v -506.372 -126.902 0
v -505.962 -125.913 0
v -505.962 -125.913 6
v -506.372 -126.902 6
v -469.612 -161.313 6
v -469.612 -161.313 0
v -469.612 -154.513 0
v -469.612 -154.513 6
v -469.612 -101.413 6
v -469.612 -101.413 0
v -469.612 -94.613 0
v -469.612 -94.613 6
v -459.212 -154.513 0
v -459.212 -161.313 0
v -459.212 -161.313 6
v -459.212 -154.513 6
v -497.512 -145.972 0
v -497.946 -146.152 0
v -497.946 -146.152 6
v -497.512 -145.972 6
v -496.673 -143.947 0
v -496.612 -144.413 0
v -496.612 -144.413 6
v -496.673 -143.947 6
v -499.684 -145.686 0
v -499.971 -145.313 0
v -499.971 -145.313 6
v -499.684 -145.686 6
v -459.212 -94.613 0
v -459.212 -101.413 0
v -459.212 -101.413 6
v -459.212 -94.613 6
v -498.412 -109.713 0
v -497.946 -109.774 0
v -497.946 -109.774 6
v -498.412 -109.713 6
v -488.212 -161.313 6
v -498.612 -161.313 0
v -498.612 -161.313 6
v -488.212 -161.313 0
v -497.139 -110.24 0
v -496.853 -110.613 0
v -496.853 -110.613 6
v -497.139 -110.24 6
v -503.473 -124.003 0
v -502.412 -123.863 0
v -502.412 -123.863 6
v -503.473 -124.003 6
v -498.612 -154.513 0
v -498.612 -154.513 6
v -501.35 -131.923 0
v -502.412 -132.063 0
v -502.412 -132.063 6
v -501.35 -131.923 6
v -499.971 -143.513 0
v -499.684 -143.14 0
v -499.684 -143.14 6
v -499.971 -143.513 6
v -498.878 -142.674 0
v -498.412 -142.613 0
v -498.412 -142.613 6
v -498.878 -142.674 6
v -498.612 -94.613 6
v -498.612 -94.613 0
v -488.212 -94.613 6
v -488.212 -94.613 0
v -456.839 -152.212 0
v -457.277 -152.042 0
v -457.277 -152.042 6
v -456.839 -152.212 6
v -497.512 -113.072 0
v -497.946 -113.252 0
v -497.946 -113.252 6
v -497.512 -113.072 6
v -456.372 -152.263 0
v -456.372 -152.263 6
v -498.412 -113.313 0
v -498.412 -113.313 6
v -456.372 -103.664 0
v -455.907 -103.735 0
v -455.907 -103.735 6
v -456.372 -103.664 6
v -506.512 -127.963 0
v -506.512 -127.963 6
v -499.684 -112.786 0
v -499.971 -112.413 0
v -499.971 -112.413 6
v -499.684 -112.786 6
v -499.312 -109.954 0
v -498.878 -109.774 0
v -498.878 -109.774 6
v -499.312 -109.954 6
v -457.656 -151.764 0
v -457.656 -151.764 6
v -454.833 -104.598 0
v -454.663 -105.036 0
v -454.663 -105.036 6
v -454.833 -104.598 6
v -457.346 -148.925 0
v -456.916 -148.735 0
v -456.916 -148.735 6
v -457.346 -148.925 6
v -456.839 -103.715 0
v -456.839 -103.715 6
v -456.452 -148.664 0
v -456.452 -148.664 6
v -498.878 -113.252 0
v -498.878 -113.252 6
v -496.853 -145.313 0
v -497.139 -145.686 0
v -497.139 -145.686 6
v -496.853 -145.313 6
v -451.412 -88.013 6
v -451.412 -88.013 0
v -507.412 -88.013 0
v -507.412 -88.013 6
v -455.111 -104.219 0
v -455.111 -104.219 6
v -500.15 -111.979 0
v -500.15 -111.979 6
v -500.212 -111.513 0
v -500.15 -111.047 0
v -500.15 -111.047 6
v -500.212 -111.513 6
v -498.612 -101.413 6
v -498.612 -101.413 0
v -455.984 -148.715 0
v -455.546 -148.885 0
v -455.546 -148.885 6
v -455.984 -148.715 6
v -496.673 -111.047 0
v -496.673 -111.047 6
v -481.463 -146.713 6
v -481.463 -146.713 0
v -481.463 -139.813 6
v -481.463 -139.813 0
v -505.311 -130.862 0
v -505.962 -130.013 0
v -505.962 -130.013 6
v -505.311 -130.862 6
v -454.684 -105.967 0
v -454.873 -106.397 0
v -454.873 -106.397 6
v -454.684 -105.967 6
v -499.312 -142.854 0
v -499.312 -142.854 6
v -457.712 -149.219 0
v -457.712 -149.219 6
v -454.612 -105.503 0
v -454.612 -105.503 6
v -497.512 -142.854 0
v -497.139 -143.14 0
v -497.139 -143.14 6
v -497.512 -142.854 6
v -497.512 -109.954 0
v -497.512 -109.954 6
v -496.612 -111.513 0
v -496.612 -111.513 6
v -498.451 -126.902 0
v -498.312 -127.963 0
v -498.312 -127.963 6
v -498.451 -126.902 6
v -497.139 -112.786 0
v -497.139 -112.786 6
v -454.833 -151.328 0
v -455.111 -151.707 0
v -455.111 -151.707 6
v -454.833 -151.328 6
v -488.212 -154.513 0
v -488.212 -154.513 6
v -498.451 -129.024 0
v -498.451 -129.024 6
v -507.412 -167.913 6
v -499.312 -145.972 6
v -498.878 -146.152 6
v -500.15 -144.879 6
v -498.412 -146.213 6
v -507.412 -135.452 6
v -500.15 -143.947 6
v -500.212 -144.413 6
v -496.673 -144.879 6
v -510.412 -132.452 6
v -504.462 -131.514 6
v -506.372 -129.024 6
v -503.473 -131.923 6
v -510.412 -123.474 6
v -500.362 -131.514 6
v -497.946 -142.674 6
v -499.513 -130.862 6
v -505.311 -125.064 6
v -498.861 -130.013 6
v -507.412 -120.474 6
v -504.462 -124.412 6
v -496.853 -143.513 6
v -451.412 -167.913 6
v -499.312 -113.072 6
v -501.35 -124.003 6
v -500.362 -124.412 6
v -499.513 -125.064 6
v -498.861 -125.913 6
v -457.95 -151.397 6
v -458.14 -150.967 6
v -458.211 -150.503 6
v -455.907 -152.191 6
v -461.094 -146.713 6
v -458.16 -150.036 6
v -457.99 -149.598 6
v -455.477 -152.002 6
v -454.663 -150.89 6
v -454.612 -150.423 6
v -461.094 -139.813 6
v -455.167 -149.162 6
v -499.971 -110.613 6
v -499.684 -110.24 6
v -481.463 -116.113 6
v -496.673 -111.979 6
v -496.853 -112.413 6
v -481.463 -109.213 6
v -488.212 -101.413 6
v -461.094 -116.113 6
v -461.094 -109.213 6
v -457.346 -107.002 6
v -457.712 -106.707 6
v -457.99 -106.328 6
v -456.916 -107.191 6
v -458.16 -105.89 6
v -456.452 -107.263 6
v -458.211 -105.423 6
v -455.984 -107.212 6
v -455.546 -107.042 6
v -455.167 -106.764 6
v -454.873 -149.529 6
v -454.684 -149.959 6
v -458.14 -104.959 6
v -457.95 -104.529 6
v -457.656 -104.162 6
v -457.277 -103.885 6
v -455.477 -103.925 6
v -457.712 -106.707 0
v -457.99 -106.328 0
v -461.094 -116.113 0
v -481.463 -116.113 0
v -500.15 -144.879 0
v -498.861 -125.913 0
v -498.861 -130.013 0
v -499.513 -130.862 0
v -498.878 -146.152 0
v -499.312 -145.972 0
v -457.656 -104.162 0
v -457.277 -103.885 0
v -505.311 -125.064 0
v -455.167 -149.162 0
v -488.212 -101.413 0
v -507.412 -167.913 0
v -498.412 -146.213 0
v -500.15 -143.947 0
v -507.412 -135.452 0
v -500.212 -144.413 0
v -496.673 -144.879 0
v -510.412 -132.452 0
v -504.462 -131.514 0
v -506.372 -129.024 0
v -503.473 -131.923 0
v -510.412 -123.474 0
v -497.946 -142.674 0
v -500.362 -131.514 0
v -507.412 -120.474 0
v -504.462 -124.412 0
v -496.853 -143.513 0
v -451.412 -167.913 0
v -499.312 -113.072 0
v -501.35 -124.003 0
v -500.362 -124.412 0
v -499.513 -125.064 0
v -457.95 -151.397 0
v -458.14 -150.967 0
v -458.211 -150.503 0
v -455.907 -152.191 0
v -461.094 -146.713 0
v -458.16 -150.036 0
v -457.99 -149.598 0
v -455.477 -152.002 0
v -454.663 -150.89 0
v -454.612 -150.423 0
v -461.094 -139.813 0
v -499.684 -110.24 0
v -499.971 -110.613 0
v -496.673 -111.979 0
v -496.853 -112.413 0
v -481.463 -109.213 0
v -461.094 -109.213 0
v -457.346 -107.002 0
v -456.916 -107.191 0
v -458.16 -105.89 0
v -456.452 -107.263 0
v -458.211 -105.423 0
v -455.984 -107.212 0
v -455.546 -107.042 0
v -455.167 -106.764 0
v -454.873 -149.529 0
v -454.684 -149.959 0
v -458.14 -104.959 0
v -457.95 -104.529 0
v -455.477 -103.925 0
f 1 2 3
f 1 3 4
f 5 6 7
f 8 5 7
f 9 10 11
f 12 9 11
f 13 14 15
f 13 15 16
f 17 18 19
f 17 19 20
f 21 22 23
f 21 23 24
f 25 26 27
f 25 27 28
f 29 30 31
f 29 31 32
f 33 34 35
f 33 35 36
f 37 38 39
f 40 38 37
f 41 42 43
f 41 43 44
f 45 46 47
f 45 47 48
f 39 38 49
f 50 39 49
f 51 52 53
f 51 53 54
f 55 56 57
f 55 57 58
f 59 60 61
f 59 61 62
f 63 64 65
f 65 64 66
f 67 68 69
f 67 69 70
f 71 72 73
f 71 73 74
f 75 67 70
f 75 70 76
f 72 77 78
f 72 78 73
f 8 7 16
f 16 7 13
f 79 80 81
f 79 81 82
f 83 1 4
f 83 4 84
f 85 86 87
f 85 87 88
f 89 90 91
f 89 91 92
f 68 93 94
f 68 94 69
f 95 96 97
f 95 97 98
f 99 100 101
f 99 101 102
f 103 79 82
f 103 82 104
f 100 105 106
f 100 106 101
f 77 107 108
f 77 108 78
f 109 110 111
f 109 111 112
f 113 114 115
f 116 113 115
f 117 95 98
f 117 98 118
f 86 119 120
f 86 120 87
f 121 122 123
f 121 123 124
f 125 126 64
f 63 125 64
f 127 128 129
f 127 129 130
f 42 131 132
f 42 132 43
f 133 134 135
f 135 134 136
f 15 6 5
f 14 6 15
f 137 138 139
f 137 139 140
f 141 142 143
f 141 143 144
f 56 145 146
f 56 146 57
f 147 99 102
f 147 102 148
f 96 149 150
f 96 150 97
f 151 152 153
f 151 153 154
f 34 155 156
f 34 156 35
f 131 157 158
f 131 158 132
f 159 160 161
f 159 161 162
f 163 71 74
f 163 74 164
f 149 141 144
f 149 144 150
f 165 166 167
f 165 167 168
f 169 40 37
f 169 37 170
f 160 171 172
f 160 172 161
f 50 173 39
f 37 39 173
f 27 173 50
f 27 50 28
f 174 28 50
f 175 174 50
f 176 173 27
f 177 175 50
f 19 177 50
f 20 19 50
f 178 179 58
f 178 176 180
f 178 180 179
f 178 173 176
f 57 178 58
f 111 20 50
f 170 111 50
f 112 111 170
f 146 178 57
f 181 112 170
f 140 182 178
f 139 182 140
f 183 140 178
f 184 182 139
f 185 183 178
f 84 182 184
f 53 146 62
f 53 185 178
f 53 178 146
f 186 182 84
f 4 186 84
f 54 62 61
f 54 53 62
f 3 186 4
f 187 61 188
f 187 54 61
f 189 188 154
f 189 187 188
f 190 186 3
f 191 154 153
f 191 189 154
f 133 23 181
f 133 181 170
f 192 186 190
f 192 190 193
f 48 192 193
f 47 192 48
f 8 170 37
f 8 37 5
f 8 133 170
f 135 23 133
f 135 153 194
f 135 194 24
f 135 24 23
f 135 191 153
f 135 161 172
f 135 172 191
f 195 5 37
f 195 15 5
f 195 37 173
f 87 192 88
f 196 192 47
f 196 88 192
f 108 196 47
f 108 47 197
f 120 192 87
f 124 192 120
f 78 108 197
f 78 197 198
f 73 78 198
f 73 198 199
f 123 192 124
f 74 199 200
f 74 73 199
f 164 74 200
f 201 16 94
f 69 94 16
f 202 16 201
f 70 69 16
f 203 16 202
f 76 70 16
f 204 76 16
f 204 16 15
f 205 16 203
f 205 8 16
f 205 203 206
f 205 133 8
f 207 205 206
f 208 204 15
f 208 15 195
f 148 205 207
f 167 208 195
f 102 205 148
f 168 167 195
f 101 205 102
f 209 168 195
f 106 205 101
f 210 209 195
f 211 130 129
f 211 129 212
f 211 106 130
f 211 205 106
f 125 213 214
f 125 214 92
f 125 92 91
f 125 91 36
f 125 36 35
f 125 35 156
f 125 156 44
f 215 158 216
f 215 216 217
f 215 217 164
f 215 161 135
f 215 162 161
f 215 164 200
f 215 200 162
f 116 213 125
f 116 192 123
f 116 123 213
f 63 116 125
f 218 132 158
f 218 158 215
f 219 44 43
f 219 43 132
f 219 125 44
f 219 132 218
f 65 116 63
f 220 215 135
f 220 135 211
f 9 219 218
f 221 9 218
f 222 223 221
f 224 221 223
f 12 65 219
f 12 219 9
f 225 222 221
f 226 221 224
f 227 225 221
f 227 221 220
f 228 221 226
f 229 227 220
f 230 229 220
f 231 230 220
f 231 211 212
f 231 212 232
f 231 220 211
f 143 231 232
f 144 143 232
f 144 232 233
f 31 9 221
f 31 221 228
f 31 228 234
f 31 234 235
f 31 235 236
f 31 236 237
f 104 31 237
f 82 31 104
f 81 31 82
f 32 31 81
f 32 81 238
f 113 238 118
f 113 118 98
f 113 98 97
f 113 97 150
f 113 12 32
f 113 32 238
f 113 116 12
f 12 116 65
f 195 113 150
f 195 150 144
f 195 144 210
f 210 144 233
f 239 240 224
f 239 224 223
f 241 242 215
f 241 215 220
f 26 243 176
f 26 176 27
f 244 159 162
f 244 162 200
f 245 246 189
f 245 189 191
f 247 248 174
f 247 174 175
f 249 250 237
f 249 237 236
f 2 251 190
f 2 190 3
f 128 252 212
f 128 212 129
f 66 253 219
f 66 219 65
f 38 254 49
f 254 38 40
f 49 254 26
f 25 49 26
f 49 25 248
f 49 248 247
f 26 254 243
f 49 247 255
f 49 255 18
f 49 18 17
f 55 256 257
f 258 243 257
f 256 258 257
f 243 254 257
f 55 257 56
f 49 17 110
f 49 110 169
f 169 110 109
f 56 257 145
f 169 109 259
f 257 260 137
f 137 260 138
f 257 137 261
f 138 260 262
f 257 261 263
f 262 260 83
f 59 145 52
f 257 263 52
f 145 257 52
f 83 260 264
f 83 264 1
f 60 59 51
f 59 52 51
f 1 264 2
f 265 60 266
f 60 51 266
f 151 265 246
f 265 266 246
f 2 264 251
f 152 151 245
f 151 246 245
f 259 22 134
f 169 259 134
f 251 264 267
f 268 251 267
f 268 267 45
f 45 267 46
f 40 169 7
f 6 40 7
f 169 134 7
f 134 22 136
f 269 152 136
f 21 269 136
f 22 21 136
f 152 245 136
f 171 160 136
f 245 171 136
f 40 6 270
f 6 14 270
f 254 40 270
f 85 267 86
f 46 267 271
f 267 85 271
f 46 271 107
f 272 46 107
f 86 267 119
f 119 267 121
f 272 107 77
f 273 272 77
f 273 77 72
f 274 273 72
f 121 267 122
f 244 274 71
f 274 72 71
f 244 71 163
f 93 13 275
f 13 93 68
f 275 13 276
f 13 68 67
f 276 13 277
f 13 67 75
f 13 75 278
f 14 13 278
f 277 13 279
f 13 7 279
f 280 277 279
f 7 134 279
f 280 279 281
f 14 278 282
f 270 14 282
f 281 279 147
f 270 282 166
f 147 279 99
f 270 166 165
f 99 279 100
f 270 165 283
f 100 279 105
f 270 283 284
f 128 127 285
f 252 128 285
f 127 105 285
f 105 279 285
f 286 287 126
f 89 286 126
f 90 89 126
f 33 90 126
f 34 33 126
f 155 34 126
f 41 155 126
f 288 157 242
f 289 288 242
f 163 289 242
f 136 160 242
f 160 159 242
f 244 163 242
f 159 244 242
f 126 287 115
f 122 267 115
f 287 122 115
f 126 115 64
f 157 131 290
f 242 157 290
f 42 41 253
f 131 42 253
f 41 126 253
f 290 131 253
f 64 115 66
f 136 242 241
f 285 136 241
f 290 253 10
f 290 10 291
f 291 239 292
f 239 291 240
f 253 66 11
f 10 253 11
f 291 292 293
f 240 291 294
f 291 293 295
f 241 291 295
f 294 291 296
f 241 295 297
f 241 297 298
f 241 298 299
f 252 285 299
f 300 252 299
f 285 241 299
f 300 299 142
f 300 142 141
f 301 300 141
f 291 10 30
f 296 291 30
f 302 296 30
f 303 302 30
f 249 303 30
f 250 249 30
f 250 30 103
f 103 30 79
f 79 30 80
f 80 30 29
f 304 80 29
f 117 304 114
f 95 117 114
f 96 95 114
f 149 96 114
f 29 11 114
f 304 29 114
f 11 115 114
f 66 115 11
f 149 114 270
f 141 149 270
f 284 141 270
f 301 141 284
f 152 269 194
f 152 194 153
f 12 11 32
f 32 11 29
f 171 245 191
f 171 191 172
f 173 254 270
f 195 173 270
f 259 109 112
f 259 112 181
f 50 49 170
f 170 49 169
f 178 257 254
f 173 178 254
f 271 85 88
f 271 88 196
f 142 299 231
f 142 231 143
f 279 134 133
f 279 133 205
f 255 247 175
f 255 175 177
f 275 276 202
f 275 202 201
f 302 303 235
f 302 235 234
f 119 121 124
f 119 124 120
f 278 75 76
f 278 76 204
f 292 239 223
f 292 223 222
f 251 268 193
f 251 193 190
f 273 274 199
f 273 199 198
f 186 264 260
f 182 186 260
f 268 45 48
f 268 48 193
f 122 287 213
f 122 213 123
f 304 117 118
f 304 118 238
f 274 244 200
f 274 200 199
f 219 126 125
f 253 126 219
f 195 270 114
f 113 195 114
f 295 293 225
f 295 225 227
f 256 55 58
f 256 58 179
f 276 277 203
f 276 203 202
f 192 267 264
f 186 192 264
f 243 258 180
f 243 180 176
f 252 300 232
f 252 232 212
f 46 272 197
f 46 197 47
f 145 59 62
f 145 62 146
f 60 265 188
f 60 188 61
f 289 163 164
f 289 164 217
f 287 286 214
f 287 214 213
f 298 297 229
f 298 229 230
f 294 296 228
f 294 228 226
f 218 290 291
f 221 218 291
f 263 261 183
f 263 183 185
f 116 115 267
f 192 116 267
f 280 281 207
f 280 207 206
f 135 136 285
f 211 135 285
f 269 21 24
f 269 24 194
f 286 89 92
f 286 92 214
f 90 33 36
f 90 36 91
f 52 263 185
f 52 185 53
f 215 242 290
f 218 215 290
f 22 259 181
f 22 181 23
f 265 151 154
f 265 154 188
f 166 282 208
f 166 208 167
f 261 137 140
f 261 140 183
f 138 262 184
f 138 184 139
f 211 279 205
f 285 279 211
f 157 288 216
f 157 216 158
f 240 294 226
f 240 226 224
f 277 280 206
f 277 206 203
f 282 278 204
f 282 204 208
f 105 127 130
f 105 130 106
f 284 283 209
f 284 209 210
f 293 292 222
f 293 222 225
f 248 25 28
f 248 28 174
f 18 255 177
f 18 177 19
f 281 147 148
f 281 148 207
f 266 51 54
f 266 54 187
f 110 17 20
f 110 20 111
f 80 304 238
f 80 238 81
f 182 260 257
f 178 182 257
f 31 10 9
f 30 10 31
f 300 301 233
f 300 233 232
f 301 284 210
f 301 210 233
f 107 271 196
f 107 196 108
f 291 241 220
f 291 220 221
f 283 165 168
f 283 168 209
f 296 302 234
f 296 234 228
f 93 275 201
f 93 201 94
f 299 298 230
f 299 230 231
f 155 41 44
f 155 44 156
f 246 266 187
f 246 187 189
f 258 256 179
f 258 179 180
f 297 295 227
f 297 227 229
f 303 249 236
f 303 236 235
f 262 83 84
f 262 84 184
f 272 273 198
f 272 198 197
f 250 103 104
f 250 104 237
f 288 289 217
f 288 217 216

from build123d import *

# Parameters (mm, degrees)
SKETCH1_W           = 20.368459162
SKETCH1_H           = 6.9
SKETCH1_W_2         = 10.4
SKETCH1_H_2         = 6.8
BOSS_EXTRUDE1_DEPTH = 6


with BuildPart() as part:
    # Sketch1 → Boss-Extrude1 (new body)
    with BuildSketch(Plane.XY):
        Polygon((-451.41165464, -88.013150874), (-507.41165464, -88.013150874), (-507.41165464, -120.474064779), (-510.41165464, -123.474064779), (-510.41165464, -132.452236968), (-507.41165464, -135.452236968), (-507.41165464, -167.913150874), (-451.41165464, -167.913150874), align=None)
        with Locations((-471.27842313, -143.263150874)):
            Rectangle(SKETCH1_W, SKETCH1_H, mode=Mode.SUBTRACT)
        Polygon((-498.31165464, -127.963150874), (-498.451358752, -126.901992789), (-498.860950485, -125.913150874), (-499.512516837, -125.064013071), (-500.36165464, -124.412446718), (-501.350496555, -124.002854986), (-502.41165464, -123.863150874), (-503.472812725, -124.002854986), (-504.46165464, -124.412446718), (-505.310792443, -125.064013071), (-505.962358796, -125.913150874), (-506.371950528, -126.901992789), (-506.51165464, -127.963150874), (-506.371950528, -129.024308959), (-505.962358796, -130.013150874), (-505.310792443, -130.862288677), (-504.46165464, -131.513855029), (-503.472812725, -131.923446762), (-502.41165464, -132.063150874), (-501.350496555, -131.923446762), (-500.36165464, -131.513855029), (-499.512516837, -130.862288677), (-498.860950485, -130.013150874), (-498.451358752, -129.024308959), align=None, mode=Mode.SUBTRACT)
        Polygon((-499.970500367, -110.613150874), (-500.150321127, -111.047276593), (-500.21165464, -111.513150874), (-500.150321127, -111.979025155), (-499.970500367, -112.413150874), (-499.684446846, -112.78594308), (-499.31165464, -113.071996601), (-498.877528921, -113.251817361), (-498.41165464, -113.313150874), (-497.945780359, -113.251817361), (-497.51165464, -113.071996601), (-497.138862434, -112.78594308), (-496.852808913, -112.413150874), (-496.672988153, -111.979025155), (-496.61165464, -111.513150874), (-496.672988153, -111.047276593), (-496.852808913, -110.613150874), (-497.138862434, -110.240358668), (-497.51165464, -109.954305147), (-497.945780359, -109.774484386), (-498.41165464, -109.713150874), (-498.877528921, -109.774484386), (-499.31165464, -109.954305147), (-499.684446846, -110.240358668), align=None, mode=Mode.SUBTRACT)
        Polygon((-458.160214968, -105.890394107), (-457.990055534, -106.328396861), (-457.712330687, -106.707434531), (-457.345966918, -107.001676326), (-456.91593131, -107.191070154), (-456.451530081, -107.262709139), (-455.984411407, -107.211711202), (-455.546408653, -107.041551767), (-455.167370983, -106.763826921), (-454.873129188, -106.397463151), (-454.68373536, -105.967427544), (-454.612096375, -105.503026315), (-454.663094312, -105.035907641), (-454.833253746, -104.597904886), (-455.110978593, -104.218867216), (-455.477342363, -103.924625421), (-455.90737797, -103.735231593), (-456.371779199, -103.663592609), (-456.838897873, -103.714590546), (-457.276900628, -103.88474998), (-457.655938298, -104.162474827), (-457.950180093, -104.528838596), (-458.139573921, -104.958874204), (-458.211212905, -105.423275433), align=None, mode=Mode.SUBTRACT)
        with Locations((-493.41165464, -157.913150874)):
            Rectangle(SKETCH1_W_2, SKETCH1_H_2, mode=Mode.SUBTRACT)
        with Locations((-493.41165464, -98.013150874)):
            Rectangle(SKETCH1_W_2, SKETCH1_H_2, mode=Mode.SUBTRACT)
        with Locations((-471.27842313, -112.663150874)):
            Rectangle(SKETCH1_W, SKETCH1_H, mode=Mode.SUBTRACT)
        Polygon((-455.546408653, -148.88474998), (-455.984411407, -148.714590546), (-456.451530081, -148.663592609), (-456.91593131, -148.735231593), (-457.345966918, -148.924625421), (-457.712330687, -149.218867216), (-457.990055534, -149.597904886), (-458.160214968, -150.035907641), (-458.211212905, -150.503026315), (-458.139573921, -150.967427544), (-457.950180093, -151.397463151), (-457.655938298, -151.763826921), (-457.276900628, -152.041551767), (-456.838897873, -152.211711202), (-456.371779199, -152.262709139), (-455.90737797, -152.191070154), (-455.477342363, -152.001676326), (-455.110978593, -151.707434531), (-454.833253746, -151.328396861), (-454.663094312, -150.890394107), (-454.612096375, -150.423275433), (-454.68373536, -149.958874204), (-454.873129188, -149.528838596), (-455.167370983, -149.162474827), align=None, mode=Mode.SUBTRACT)
        with Locations((-464.41165464, -157.913150874)):
            Rectangle(SKETCH1_W_2, SKETCH1_H_2, mode=Mode.SUBTRACT)
        with Locations((-464.41165464, -98.013150874)):
            Rectangle(SKETCH1_W_2, SKETCH1_H_2, mode=Mode.SUBTRACT)
        Polygon((-499.970500367, -143.513150874), (-500.150321127, -143.947276593), (-500.21165464, -144.413150874), (-500.150321127, -144.879025155), (-499.970500367, -145.313150874), (-499.684446846, -145.68594308), (-499.31165464, -145.971996601), (-498.877528921, -146.151817361), (-498.41165464, -146.213150874), (-497.945780359, -146.151817361), (-497.51165464, -145.971996601), (-497.138862434, -145.68594308), (-496.852808913, -145.313150874), (-496.672988153, -144.879025155), (-496.61165464, -144.413150874), (-496.672988153, -143.947276593), (-496.852808913, -143.513150874), (-497.138862434, -143.140358668), (-497.51165464, -142.854305147), (-497.945780359, -142.674484386), (-498.41165464, -142.613150874), (-498.877528921, -142.674484386), (-499.31165464, -142.854305147), (-499.684446846, -143.140358668), align=None, mode=Mode.SUBTRACT)
    extrude(amount=BOSS_EXTRUDE1_DEPTH)


solid = part.part
